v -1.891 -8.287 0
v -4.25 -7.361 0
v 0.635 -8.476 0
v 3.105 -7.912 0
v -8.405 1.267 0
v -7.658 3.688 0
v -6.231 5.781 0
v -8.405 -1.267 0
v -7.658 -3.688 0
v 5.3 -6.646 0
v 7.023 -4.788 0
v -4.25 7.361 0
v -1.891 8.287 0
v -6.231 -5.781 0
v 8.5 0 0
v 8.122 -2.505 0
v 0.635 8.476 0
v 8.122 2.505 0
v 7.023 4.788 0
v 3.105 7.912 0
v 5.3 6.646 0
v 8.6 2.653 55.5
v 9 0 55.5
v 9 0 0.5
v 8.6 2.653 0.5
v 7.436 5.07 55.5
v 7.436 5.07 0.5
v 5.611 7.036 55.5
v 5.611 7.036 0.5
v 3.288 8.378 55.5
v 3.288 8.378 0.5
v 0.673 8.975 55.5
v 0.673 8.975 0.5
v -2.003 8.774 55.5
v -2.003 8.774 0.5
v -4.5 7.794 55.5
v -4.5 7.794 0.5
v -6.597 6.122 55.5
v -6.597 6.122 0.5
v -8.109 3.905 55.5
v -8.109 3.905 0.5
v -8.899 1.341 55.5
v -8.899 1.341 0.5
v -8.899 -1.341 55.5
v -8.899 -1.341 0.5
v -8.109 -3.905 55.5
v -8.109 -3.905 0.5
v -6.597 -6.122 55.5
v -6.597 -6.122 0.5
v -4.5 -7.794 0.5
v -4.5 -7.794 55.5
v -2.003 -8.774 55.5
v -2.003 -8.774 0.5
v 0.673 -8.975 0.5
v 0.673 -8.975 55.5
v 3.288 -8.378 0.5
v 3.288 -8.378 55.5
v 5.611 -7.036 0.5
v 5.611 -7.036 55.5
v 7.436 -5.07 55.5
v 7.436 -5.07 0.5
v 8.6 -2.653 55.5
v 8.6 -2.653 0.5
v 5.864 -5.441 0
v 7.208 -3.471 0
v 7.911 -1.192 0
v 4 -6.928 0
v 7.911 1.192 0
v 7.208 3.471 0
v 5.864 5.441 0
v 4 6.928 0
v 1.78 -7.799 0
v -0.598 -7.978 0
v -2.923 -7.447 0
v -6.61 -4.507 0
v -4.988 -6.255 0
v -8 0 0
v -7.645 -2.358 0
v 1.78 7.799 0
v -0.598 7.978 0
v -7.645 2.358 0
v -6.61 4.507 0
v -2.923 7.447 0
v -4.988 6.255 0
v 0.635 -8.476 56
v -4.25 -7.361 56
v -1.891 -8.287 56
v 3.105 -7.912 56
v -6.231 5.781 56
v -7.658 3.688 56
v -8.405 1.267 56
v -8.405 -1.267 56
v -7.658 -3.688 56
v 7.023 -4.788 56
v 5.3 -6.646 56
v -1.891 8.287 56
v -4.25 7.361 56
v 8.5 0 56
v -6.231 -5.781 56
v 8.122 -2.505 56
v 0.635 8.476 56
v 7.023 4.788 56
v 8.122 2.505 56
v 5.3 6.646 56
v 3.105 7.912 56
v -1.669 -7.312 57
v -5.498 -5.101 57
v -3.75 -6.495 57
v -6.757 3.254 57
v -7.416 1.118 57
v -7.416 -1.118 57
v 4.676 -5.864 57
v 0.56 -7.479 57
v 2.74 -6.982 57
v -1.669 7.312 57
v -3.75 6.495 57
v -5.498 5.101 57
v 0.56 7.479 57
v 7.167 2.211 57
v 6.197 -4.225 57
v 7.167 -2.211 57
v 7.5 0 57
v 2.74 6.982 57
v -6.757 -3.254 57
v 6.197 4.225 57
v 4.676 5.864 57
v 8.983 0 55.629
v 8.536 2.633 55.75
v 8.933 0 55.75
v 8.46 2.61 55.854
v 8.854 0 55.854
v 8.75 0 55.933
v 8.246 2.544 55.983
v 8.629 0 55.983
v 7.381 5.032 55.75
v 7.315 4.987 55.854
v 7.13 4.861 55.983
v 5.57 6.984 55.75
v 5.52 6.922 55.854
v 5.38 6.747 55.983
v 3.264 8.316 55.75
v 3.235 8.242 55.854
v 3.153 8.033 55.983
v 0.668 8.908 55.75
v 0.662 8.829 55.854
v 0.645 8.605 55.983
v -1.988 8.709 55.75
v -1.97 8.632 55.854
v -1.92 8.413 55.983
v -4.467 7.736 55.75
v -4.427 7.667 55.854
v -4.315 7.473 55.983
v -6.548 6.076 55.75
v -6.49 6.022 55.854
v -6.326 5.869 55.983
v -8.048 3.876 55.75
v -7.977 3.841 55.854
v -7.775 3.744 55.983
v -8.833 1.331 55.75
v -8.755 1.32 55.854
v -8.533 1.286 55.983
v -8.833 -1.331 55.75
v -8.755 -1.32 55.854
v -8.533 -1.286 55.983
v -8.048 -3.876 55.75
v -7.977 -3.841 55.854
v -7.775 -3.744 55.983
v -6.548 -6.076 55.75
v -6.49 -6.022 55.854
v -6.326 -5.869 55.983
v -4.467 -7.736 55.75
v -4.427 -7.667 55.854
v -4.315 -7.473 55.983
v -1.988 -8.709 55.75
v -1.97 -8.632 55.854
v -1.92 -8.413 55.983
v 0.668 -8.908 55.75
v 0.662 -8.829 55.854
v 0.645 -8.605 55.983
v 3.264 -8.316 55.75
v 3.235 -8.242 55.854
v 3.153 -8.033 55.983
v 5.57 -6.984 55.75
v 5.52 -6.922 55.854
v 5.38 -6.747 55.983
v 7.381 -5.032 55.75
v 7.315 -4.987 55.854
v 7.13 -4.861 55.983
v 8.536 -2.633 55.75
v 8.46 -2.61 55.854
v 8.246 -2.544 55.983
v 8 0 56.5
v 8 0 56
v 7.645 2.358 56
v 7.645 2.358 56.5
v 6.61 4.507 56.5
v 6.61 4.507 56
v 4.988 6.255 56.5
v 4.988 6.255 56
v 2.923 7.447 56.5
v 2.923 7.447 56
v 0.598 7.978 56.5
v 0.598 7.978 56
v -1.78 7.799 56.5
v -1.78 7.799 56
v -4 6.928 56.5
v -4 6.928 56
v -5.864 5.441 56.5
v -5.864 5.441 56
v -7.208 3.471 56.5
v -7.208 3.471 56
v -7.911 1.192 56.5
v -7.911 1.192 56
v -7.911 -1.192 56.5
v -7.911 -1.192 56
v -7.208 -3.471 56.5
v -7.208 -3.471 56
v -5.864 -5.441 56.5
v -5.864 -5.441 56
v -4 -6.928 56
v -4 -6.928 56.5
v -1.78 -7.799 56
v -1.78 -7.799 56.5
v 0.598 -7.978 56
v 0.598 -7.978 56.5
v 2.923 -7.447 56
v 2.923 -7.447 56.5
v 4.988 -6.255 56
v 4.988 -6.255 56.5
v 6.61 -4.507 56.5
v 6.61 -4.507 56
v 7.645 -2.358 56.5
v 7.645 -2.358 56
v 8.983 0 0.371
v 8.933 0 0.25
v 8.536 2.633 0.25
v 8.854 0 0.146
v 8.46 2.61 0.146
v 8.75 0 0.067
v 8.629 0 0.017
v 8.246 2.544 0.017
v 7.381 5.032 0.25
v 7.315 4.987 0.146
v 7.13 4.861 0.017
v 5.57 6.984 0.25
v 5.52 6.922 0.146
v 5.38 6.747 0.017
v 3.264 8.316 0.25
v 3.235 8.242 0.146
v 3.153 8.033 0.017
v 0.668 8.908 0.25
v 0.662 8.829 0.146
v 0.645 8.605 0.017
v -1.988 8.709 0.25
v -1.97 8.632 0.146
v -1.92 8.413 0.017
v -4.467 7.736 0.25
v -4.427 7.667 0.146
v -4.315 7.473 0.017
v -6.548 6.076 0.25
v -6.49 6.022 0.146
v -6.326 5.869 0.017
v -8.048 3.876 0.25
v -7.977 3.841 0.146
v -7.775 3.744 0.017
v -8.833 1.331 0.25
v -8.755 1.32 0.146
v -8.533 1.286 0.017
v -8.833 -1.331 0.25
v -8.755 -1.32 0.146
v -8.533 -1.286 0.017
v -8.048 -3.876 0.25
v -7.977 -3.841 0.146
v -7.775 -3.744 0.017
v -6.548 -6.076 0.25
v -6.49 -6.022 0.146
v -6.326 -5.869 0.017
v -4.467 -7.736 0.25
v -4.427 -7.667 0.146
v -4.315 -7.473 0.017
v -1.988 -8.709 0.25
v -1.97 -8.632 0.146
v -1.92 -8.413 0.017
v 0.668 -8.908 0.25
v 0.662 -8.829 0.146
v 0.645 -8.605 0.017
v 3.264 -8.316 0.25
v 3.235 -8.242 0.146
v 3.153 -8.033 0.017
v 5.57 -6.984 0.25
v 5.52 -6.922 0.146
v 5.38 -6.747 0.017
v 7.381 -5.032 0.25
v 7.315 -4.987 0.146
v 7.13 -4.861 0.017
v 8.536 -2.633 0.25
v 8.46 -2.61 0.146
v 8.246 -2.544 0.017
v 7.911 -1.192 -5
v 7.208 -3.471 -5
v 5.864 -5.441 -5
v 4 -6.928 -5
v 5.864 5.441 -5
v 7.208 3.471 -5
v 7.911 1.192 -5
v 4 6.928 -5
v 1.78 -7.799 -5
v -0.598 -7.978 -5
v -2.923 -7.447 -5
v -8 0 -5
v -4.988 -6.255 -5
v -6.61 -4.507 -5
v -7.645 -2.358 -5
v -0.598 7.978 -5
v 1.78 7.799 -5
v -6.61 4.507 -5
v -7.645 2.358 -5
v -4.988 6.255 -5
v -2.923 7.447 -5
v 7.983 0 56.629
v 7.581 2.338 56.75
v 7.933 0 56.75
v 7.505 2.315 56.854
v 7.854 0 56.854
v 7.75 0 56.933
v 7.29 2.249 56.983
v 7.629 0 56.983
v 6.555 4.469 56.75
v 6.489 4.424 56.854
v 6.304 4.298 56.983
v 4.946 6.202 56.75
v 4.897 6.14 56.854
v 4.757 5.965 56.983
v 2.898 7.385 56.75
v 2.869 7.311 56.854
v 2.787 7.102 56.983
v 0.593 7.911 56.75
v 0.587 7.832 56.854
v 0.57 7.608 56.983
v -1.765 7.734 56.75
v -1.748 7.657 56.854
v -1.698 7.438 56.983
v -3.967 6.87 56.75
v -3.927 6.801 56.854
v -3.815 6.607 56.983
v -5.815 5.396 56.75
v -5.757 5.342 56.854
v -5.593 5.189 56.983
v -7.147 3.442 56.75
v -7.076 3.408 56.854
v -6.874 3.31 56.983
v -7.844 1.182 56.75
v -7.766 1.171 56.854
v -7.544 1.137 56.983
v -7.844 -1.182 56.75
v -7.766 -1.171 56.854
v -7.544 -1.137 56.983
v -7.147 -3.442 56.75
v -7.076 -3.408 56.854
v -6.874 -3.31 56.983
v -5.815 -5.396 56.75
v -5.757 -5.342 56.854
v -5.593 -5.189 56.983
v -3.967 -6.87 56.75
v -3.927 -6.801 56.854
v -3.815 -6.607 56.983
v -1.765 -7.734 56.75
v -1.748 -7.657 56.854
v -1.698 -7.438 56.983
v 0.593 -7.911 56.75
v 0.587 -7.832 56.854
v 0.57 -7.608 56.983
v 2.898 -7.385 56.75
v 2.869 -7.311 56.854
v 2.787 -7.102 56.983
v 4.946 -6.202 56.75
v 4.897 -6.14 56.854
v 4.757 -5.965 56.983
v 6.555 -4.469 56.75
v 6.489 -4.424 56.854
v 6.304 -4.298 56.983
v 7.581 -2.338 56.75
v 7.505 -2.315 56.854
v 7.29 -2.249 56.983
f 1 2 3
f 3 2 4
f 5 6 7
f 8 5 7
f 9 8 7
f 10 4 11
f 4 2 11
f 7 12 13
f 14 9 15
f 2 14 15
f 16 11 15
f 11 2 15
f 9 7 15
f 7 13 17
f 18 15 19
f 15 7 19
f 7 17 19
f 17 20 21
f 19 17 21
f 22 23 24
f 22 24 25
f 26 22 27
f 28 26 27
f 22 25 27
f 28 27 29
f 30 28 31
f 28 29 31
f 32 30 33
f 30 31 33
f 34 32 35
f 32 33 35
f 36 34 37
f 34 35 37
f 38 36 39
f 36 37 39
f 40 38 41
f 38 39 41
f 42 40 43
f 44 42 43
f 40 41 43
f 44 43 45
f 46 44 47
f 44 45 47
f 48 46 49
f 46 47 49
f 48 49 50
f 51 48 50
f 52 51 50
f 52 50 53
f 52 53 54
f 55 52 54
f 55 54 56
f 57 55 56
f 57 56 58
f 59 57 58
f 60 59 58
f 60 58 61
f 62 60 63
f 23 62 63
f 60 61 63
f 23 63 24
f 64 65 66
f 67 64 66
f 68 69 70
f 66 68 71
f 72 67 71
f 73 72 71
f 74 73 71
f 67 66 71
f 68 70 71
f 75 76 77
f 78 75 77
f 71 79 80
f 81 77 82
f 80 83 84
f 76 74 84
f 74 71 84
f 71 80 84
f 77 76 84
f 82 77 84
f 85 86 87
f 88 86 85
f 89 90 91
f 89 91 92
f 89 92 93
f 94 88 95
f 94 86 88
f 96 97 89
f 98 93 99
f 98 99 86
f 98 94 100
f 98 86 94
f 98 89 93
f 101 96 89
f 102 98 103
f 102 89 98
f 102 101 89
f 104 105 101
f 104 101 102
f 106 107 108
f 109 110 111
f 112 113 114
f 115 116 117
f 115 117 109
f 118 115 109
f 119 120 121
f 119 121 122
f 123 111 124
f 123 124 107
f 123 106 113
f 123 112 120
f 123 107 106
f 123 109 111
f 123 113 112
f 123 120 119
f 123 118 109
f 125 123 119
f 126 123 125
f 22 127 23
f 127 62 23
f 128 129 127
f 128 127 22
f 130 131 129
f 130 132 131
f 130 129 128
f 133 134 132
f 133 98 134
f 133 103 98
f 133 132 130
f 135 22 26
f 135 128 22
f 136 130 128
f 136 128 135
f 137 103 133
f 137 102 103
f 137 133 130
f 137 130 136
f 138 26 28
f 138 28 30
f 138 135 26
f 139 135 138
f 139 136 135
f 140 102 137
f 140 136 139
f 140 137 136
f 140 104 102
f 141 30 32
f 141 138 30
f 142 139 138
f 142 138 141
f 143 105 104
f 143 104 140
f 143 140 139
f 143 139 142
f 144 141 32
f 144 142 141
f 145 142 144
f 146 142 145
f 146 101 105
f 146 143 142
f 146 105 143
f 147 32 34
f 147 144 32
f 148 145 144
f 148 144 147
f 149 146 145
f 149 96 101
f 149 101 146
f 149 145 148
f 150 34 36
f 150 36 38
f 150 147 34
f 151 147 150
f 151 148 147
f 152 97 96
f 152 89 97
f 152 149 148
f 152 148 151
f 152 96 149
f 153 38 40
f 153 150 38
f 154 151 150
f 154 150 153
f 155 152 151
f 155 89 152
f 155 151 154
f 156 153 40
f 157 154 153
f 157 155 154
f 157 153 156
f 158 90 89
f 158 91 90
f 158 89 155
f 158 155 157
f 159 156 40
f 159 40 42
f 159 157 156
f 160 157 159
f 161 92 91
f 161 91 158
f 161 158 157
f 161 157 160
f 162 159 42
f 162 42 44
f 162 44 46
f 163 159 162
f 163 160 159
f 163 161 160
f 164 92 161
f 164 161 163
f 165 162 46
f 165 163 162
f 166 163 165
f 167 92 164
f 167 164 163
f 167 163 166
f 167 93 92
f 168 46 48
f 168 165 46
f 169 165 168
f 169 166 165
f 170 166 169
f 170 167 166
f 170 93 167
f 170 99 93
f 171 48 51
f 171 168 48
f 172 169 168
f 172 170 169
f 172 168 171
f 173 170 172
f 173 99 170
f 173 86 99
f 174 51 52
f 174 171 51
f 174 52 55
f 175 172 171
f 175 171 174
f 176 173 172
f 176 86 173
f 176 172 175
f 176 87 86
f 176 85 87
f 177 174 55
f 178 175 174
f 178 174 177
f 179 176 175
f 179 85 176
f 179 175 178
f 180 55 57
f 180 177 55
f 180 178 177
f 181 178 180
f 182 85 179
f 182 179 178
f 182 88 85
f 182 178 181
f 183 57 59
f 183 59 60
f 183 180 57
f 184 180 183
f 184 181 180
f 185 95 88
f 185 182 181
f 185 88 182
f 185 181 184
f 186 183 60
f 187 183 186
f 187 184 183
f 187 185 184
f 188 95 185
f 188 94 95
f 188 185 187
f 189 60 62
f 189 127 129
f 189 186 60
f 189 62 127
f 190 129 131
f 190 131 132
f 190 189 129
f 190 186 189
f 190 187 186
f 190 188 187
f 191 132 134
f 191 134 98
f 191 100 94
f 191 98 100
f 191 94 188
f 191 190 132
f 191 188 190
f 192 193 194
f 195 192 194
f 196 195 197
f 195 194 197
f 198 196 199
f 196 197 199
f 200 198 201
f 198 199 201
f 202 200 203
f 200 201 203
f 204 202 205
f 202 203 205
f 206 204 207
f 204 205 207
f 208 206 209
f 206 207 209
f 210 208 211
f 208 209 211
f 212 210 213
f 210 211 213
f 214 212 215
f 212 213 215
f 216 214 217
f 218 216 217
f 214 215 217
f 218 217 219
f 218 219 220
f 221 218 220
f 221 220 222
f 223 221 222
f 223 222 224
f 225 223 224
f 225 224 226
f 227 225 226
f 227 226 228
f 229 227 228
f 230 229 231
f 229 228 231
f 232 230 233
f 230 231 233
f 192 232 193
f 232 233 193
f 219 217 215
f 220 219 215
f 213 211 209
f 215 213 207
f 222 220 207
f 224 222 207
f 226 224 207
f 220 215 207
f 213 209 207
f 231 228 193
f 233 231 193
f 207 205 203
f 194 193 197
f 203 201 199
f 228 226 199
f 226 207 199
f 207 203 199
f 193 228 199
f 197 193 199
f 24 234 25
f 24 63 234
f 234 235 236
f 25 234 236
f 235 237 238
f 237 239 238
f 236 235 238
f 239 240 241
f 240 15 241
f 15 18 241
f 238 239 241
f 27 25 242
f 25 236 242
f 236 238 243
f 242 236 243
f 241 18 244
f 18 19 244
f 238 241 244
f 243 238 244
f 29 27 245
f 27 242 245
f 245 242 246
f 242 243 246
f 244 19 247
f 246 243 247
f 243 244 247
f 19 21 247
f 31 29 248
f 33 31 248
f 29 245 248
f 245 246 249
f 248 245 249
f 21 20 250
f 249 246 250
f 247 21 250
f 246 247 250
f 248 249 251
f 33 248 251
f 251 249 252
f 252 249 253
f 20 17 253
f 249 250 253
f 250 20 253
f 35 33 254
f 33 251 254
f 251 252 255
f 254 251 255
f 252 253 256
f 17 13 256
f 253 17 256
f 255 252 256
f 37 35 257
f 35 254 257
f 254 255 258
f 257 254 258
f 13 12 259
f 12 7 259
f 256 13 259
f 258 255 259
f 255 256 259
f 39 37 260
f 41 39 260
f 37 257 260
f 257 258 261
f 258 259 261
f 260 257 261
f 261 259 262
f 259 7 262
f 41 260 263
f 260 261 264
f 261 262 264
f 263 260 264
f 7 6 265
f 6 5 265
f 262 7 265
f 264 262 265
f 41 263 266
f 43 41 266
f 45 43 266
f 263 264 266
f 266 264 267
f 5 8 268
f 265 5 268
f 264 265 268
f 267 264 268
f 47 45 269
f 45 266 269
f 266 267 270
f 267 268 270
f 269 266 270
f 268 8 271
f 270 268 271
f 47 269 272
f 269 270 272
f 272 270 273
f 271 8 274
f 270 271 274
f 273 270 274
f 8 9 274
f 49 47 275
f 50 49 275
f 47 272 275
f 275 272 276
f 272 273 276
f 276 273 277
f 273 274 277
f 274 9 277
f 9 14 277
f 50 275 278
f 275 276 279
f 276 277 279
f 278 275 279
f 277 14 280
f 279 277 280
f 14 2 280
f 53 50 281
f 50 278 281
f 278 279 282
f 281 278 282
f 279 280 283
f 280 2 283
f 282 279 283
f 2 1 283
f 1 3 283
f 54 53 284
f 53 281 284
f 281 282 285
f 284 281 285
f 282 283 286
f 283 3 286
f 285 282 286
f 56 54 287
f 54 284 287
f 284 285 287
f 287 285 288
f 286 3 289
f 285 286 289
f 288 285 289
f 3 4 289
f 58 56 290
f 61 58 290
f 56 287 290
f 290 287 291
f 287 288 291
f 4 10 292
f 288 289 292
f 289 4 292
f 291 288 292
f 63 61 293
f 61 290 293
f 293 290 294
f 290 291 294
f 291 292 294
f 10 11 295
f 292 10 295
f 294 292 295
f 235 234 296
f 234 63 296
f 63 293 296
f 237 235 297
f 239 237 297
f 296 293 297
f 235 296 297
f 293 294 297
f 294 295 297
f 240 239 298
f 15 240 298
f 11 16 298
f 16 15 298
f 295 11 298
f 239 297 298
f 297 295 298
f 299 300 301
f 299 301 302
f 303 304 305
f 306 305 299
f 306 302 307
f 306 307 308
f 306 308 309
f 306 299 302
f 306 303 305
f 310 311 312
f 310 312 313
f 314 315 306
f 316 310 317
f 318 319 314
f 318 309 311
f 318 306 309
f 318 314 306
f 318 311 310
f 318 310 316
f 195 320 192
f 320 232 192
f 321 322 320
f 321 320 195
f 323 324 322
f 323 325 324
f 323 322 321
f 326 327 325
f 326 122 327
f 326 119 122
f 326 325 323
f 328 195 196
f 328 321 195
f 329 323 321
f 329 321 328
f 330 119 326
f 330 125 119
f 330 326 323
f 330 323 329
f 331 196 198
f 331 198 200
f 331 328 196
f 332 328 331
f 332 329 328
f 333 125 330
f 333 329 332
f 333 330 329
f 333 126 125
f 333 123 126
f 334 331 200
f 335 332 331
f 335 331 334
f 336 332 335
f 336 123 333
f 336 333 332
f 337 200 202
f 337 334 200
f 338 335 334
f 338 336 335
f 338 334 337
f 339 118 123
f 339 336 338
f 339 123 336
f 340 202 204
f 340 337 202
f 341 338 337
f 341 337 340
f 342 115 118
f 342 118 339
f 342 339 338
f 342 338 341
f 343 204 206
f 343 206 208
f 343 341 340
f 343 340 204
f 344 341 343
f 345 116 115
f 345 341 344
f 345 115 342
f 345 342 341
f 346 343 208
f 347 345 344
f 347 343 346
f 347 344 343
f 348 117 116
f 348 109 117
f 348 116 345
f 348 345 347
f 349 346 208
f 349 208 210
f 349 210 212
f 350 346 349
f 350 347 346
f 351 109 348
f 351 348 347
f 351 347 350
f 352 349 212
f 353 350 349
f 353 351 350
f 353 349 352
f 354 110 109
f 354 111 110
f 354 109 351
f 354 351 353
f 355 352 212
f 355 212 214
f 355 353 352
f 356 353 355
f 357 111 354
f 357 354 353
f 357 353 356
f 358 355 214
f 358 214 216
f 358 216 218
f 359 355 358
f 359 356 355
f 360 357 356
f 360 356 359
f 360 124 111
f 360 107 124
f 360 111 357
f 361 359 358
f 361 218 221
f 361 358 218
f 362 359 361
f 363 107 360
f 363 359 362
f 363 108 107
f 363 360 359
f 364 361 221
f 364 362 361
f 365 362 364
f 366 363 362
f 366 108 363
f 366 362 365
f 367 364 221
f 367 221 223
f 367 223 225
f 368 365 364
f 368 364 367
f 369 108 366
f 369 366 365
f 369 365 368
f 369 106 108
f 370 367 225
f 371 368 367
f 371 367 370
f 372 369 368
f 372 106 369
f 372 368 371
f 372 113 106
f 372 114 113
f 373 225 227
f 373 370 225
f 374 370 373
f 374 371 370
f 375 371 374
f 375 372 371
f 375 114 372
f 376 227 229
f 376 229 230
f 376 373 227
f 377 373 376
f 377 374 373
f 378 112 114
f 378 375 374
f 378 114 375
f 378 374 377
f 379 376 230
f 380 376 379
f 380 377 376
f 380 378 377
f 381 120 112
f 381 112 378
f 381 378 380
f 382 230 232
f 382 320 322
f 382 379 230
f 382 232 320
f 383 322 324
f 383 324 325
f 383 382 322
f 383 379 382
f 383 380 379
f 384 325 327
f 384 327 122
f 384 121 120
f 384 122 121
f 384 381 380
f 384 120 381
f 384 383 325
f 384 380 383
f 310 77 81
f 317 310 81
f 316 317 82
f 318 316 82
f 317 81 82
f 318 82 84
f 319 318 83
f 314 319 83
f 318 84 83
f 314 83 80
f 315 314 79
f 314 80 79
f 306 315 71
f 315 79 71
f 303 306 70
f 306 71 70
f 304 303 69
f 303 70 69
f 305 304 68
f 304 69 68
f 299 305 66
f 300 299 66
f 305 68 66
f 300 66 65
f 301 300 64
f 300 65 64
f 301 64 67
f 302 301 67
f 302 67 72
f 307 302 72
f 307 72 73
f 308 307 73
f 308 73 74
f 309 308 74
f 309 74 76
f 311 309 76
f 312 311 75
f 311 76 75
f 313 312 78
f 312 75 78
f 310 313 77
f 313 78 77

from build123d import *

# Parameters (mm, degrees)
ESQUISSE1_R        = 9
BOSS_EXTRU_1_DEPTH = 56
ESQUISSE2_R        = 8
BOSS_EXTRU_2_DEPTH = 1
ESQUISSE3_R        = 8
BOSS_EXTRU_3_DEPTH = 5
CONG_1_R           = 0.5
CONG_2_R           = 0.5
CONG_3_R           = 0.5


with BuildPart() as part:
    # Esquisse1 → Boss.-Extru.1 (new body)
    with BuildSketch(Plane.XY):
        Circle(ESQUISSE1_R)
    extrude(amount=BOSS_EXTRU_1_DEPTH)

    # Congé2
    cong_2_edges = [part.edges().sort_by_distance(p)[0] for p in [
        (-9, 0, 56),
    ]]
    fillet(cong_2_edges, radius=CONG_2_R)

    # Congé3
    cong_3_edges = [part.edges().sort_by_distance(p)[0] for p in [
        (-9, 0, 0),
    ]]
    fillet(cong_3_edges, radius=CONG_3_R)


with BuildPart() as body_2:
    # Esquisse2 → Boss.-Extru.2 (new body)
    with BuildSketch(Plane.XY.offset(56)):
        Circle(ESQUISSE2_R)
    extrude(amount=BOSS_EXTRU_2_DEPTH)

    # Congé1
    cong_1_edges = [body_2.edges().sort_by_distance(p)[0] for p in [
        (-8, 0, 57),
    ]]
    fillet(cong_1_edges, radius=CONG_1_R)


with BuildPart() as body_3:
    # Esquisse3 → Boss.-Extru.3 (new body)
    with BuildSketch(Plane(origin=(0, 0, 0), x_dir=(-1, 0, 0), z_dir=(0, 0, -1))):
        Circle(ESQUISSE3_R)
    extrude(amount=BOSS_EXTRU_3_DEPTH)


solid = Compound([part.part, body_2.part, body_3.part])
